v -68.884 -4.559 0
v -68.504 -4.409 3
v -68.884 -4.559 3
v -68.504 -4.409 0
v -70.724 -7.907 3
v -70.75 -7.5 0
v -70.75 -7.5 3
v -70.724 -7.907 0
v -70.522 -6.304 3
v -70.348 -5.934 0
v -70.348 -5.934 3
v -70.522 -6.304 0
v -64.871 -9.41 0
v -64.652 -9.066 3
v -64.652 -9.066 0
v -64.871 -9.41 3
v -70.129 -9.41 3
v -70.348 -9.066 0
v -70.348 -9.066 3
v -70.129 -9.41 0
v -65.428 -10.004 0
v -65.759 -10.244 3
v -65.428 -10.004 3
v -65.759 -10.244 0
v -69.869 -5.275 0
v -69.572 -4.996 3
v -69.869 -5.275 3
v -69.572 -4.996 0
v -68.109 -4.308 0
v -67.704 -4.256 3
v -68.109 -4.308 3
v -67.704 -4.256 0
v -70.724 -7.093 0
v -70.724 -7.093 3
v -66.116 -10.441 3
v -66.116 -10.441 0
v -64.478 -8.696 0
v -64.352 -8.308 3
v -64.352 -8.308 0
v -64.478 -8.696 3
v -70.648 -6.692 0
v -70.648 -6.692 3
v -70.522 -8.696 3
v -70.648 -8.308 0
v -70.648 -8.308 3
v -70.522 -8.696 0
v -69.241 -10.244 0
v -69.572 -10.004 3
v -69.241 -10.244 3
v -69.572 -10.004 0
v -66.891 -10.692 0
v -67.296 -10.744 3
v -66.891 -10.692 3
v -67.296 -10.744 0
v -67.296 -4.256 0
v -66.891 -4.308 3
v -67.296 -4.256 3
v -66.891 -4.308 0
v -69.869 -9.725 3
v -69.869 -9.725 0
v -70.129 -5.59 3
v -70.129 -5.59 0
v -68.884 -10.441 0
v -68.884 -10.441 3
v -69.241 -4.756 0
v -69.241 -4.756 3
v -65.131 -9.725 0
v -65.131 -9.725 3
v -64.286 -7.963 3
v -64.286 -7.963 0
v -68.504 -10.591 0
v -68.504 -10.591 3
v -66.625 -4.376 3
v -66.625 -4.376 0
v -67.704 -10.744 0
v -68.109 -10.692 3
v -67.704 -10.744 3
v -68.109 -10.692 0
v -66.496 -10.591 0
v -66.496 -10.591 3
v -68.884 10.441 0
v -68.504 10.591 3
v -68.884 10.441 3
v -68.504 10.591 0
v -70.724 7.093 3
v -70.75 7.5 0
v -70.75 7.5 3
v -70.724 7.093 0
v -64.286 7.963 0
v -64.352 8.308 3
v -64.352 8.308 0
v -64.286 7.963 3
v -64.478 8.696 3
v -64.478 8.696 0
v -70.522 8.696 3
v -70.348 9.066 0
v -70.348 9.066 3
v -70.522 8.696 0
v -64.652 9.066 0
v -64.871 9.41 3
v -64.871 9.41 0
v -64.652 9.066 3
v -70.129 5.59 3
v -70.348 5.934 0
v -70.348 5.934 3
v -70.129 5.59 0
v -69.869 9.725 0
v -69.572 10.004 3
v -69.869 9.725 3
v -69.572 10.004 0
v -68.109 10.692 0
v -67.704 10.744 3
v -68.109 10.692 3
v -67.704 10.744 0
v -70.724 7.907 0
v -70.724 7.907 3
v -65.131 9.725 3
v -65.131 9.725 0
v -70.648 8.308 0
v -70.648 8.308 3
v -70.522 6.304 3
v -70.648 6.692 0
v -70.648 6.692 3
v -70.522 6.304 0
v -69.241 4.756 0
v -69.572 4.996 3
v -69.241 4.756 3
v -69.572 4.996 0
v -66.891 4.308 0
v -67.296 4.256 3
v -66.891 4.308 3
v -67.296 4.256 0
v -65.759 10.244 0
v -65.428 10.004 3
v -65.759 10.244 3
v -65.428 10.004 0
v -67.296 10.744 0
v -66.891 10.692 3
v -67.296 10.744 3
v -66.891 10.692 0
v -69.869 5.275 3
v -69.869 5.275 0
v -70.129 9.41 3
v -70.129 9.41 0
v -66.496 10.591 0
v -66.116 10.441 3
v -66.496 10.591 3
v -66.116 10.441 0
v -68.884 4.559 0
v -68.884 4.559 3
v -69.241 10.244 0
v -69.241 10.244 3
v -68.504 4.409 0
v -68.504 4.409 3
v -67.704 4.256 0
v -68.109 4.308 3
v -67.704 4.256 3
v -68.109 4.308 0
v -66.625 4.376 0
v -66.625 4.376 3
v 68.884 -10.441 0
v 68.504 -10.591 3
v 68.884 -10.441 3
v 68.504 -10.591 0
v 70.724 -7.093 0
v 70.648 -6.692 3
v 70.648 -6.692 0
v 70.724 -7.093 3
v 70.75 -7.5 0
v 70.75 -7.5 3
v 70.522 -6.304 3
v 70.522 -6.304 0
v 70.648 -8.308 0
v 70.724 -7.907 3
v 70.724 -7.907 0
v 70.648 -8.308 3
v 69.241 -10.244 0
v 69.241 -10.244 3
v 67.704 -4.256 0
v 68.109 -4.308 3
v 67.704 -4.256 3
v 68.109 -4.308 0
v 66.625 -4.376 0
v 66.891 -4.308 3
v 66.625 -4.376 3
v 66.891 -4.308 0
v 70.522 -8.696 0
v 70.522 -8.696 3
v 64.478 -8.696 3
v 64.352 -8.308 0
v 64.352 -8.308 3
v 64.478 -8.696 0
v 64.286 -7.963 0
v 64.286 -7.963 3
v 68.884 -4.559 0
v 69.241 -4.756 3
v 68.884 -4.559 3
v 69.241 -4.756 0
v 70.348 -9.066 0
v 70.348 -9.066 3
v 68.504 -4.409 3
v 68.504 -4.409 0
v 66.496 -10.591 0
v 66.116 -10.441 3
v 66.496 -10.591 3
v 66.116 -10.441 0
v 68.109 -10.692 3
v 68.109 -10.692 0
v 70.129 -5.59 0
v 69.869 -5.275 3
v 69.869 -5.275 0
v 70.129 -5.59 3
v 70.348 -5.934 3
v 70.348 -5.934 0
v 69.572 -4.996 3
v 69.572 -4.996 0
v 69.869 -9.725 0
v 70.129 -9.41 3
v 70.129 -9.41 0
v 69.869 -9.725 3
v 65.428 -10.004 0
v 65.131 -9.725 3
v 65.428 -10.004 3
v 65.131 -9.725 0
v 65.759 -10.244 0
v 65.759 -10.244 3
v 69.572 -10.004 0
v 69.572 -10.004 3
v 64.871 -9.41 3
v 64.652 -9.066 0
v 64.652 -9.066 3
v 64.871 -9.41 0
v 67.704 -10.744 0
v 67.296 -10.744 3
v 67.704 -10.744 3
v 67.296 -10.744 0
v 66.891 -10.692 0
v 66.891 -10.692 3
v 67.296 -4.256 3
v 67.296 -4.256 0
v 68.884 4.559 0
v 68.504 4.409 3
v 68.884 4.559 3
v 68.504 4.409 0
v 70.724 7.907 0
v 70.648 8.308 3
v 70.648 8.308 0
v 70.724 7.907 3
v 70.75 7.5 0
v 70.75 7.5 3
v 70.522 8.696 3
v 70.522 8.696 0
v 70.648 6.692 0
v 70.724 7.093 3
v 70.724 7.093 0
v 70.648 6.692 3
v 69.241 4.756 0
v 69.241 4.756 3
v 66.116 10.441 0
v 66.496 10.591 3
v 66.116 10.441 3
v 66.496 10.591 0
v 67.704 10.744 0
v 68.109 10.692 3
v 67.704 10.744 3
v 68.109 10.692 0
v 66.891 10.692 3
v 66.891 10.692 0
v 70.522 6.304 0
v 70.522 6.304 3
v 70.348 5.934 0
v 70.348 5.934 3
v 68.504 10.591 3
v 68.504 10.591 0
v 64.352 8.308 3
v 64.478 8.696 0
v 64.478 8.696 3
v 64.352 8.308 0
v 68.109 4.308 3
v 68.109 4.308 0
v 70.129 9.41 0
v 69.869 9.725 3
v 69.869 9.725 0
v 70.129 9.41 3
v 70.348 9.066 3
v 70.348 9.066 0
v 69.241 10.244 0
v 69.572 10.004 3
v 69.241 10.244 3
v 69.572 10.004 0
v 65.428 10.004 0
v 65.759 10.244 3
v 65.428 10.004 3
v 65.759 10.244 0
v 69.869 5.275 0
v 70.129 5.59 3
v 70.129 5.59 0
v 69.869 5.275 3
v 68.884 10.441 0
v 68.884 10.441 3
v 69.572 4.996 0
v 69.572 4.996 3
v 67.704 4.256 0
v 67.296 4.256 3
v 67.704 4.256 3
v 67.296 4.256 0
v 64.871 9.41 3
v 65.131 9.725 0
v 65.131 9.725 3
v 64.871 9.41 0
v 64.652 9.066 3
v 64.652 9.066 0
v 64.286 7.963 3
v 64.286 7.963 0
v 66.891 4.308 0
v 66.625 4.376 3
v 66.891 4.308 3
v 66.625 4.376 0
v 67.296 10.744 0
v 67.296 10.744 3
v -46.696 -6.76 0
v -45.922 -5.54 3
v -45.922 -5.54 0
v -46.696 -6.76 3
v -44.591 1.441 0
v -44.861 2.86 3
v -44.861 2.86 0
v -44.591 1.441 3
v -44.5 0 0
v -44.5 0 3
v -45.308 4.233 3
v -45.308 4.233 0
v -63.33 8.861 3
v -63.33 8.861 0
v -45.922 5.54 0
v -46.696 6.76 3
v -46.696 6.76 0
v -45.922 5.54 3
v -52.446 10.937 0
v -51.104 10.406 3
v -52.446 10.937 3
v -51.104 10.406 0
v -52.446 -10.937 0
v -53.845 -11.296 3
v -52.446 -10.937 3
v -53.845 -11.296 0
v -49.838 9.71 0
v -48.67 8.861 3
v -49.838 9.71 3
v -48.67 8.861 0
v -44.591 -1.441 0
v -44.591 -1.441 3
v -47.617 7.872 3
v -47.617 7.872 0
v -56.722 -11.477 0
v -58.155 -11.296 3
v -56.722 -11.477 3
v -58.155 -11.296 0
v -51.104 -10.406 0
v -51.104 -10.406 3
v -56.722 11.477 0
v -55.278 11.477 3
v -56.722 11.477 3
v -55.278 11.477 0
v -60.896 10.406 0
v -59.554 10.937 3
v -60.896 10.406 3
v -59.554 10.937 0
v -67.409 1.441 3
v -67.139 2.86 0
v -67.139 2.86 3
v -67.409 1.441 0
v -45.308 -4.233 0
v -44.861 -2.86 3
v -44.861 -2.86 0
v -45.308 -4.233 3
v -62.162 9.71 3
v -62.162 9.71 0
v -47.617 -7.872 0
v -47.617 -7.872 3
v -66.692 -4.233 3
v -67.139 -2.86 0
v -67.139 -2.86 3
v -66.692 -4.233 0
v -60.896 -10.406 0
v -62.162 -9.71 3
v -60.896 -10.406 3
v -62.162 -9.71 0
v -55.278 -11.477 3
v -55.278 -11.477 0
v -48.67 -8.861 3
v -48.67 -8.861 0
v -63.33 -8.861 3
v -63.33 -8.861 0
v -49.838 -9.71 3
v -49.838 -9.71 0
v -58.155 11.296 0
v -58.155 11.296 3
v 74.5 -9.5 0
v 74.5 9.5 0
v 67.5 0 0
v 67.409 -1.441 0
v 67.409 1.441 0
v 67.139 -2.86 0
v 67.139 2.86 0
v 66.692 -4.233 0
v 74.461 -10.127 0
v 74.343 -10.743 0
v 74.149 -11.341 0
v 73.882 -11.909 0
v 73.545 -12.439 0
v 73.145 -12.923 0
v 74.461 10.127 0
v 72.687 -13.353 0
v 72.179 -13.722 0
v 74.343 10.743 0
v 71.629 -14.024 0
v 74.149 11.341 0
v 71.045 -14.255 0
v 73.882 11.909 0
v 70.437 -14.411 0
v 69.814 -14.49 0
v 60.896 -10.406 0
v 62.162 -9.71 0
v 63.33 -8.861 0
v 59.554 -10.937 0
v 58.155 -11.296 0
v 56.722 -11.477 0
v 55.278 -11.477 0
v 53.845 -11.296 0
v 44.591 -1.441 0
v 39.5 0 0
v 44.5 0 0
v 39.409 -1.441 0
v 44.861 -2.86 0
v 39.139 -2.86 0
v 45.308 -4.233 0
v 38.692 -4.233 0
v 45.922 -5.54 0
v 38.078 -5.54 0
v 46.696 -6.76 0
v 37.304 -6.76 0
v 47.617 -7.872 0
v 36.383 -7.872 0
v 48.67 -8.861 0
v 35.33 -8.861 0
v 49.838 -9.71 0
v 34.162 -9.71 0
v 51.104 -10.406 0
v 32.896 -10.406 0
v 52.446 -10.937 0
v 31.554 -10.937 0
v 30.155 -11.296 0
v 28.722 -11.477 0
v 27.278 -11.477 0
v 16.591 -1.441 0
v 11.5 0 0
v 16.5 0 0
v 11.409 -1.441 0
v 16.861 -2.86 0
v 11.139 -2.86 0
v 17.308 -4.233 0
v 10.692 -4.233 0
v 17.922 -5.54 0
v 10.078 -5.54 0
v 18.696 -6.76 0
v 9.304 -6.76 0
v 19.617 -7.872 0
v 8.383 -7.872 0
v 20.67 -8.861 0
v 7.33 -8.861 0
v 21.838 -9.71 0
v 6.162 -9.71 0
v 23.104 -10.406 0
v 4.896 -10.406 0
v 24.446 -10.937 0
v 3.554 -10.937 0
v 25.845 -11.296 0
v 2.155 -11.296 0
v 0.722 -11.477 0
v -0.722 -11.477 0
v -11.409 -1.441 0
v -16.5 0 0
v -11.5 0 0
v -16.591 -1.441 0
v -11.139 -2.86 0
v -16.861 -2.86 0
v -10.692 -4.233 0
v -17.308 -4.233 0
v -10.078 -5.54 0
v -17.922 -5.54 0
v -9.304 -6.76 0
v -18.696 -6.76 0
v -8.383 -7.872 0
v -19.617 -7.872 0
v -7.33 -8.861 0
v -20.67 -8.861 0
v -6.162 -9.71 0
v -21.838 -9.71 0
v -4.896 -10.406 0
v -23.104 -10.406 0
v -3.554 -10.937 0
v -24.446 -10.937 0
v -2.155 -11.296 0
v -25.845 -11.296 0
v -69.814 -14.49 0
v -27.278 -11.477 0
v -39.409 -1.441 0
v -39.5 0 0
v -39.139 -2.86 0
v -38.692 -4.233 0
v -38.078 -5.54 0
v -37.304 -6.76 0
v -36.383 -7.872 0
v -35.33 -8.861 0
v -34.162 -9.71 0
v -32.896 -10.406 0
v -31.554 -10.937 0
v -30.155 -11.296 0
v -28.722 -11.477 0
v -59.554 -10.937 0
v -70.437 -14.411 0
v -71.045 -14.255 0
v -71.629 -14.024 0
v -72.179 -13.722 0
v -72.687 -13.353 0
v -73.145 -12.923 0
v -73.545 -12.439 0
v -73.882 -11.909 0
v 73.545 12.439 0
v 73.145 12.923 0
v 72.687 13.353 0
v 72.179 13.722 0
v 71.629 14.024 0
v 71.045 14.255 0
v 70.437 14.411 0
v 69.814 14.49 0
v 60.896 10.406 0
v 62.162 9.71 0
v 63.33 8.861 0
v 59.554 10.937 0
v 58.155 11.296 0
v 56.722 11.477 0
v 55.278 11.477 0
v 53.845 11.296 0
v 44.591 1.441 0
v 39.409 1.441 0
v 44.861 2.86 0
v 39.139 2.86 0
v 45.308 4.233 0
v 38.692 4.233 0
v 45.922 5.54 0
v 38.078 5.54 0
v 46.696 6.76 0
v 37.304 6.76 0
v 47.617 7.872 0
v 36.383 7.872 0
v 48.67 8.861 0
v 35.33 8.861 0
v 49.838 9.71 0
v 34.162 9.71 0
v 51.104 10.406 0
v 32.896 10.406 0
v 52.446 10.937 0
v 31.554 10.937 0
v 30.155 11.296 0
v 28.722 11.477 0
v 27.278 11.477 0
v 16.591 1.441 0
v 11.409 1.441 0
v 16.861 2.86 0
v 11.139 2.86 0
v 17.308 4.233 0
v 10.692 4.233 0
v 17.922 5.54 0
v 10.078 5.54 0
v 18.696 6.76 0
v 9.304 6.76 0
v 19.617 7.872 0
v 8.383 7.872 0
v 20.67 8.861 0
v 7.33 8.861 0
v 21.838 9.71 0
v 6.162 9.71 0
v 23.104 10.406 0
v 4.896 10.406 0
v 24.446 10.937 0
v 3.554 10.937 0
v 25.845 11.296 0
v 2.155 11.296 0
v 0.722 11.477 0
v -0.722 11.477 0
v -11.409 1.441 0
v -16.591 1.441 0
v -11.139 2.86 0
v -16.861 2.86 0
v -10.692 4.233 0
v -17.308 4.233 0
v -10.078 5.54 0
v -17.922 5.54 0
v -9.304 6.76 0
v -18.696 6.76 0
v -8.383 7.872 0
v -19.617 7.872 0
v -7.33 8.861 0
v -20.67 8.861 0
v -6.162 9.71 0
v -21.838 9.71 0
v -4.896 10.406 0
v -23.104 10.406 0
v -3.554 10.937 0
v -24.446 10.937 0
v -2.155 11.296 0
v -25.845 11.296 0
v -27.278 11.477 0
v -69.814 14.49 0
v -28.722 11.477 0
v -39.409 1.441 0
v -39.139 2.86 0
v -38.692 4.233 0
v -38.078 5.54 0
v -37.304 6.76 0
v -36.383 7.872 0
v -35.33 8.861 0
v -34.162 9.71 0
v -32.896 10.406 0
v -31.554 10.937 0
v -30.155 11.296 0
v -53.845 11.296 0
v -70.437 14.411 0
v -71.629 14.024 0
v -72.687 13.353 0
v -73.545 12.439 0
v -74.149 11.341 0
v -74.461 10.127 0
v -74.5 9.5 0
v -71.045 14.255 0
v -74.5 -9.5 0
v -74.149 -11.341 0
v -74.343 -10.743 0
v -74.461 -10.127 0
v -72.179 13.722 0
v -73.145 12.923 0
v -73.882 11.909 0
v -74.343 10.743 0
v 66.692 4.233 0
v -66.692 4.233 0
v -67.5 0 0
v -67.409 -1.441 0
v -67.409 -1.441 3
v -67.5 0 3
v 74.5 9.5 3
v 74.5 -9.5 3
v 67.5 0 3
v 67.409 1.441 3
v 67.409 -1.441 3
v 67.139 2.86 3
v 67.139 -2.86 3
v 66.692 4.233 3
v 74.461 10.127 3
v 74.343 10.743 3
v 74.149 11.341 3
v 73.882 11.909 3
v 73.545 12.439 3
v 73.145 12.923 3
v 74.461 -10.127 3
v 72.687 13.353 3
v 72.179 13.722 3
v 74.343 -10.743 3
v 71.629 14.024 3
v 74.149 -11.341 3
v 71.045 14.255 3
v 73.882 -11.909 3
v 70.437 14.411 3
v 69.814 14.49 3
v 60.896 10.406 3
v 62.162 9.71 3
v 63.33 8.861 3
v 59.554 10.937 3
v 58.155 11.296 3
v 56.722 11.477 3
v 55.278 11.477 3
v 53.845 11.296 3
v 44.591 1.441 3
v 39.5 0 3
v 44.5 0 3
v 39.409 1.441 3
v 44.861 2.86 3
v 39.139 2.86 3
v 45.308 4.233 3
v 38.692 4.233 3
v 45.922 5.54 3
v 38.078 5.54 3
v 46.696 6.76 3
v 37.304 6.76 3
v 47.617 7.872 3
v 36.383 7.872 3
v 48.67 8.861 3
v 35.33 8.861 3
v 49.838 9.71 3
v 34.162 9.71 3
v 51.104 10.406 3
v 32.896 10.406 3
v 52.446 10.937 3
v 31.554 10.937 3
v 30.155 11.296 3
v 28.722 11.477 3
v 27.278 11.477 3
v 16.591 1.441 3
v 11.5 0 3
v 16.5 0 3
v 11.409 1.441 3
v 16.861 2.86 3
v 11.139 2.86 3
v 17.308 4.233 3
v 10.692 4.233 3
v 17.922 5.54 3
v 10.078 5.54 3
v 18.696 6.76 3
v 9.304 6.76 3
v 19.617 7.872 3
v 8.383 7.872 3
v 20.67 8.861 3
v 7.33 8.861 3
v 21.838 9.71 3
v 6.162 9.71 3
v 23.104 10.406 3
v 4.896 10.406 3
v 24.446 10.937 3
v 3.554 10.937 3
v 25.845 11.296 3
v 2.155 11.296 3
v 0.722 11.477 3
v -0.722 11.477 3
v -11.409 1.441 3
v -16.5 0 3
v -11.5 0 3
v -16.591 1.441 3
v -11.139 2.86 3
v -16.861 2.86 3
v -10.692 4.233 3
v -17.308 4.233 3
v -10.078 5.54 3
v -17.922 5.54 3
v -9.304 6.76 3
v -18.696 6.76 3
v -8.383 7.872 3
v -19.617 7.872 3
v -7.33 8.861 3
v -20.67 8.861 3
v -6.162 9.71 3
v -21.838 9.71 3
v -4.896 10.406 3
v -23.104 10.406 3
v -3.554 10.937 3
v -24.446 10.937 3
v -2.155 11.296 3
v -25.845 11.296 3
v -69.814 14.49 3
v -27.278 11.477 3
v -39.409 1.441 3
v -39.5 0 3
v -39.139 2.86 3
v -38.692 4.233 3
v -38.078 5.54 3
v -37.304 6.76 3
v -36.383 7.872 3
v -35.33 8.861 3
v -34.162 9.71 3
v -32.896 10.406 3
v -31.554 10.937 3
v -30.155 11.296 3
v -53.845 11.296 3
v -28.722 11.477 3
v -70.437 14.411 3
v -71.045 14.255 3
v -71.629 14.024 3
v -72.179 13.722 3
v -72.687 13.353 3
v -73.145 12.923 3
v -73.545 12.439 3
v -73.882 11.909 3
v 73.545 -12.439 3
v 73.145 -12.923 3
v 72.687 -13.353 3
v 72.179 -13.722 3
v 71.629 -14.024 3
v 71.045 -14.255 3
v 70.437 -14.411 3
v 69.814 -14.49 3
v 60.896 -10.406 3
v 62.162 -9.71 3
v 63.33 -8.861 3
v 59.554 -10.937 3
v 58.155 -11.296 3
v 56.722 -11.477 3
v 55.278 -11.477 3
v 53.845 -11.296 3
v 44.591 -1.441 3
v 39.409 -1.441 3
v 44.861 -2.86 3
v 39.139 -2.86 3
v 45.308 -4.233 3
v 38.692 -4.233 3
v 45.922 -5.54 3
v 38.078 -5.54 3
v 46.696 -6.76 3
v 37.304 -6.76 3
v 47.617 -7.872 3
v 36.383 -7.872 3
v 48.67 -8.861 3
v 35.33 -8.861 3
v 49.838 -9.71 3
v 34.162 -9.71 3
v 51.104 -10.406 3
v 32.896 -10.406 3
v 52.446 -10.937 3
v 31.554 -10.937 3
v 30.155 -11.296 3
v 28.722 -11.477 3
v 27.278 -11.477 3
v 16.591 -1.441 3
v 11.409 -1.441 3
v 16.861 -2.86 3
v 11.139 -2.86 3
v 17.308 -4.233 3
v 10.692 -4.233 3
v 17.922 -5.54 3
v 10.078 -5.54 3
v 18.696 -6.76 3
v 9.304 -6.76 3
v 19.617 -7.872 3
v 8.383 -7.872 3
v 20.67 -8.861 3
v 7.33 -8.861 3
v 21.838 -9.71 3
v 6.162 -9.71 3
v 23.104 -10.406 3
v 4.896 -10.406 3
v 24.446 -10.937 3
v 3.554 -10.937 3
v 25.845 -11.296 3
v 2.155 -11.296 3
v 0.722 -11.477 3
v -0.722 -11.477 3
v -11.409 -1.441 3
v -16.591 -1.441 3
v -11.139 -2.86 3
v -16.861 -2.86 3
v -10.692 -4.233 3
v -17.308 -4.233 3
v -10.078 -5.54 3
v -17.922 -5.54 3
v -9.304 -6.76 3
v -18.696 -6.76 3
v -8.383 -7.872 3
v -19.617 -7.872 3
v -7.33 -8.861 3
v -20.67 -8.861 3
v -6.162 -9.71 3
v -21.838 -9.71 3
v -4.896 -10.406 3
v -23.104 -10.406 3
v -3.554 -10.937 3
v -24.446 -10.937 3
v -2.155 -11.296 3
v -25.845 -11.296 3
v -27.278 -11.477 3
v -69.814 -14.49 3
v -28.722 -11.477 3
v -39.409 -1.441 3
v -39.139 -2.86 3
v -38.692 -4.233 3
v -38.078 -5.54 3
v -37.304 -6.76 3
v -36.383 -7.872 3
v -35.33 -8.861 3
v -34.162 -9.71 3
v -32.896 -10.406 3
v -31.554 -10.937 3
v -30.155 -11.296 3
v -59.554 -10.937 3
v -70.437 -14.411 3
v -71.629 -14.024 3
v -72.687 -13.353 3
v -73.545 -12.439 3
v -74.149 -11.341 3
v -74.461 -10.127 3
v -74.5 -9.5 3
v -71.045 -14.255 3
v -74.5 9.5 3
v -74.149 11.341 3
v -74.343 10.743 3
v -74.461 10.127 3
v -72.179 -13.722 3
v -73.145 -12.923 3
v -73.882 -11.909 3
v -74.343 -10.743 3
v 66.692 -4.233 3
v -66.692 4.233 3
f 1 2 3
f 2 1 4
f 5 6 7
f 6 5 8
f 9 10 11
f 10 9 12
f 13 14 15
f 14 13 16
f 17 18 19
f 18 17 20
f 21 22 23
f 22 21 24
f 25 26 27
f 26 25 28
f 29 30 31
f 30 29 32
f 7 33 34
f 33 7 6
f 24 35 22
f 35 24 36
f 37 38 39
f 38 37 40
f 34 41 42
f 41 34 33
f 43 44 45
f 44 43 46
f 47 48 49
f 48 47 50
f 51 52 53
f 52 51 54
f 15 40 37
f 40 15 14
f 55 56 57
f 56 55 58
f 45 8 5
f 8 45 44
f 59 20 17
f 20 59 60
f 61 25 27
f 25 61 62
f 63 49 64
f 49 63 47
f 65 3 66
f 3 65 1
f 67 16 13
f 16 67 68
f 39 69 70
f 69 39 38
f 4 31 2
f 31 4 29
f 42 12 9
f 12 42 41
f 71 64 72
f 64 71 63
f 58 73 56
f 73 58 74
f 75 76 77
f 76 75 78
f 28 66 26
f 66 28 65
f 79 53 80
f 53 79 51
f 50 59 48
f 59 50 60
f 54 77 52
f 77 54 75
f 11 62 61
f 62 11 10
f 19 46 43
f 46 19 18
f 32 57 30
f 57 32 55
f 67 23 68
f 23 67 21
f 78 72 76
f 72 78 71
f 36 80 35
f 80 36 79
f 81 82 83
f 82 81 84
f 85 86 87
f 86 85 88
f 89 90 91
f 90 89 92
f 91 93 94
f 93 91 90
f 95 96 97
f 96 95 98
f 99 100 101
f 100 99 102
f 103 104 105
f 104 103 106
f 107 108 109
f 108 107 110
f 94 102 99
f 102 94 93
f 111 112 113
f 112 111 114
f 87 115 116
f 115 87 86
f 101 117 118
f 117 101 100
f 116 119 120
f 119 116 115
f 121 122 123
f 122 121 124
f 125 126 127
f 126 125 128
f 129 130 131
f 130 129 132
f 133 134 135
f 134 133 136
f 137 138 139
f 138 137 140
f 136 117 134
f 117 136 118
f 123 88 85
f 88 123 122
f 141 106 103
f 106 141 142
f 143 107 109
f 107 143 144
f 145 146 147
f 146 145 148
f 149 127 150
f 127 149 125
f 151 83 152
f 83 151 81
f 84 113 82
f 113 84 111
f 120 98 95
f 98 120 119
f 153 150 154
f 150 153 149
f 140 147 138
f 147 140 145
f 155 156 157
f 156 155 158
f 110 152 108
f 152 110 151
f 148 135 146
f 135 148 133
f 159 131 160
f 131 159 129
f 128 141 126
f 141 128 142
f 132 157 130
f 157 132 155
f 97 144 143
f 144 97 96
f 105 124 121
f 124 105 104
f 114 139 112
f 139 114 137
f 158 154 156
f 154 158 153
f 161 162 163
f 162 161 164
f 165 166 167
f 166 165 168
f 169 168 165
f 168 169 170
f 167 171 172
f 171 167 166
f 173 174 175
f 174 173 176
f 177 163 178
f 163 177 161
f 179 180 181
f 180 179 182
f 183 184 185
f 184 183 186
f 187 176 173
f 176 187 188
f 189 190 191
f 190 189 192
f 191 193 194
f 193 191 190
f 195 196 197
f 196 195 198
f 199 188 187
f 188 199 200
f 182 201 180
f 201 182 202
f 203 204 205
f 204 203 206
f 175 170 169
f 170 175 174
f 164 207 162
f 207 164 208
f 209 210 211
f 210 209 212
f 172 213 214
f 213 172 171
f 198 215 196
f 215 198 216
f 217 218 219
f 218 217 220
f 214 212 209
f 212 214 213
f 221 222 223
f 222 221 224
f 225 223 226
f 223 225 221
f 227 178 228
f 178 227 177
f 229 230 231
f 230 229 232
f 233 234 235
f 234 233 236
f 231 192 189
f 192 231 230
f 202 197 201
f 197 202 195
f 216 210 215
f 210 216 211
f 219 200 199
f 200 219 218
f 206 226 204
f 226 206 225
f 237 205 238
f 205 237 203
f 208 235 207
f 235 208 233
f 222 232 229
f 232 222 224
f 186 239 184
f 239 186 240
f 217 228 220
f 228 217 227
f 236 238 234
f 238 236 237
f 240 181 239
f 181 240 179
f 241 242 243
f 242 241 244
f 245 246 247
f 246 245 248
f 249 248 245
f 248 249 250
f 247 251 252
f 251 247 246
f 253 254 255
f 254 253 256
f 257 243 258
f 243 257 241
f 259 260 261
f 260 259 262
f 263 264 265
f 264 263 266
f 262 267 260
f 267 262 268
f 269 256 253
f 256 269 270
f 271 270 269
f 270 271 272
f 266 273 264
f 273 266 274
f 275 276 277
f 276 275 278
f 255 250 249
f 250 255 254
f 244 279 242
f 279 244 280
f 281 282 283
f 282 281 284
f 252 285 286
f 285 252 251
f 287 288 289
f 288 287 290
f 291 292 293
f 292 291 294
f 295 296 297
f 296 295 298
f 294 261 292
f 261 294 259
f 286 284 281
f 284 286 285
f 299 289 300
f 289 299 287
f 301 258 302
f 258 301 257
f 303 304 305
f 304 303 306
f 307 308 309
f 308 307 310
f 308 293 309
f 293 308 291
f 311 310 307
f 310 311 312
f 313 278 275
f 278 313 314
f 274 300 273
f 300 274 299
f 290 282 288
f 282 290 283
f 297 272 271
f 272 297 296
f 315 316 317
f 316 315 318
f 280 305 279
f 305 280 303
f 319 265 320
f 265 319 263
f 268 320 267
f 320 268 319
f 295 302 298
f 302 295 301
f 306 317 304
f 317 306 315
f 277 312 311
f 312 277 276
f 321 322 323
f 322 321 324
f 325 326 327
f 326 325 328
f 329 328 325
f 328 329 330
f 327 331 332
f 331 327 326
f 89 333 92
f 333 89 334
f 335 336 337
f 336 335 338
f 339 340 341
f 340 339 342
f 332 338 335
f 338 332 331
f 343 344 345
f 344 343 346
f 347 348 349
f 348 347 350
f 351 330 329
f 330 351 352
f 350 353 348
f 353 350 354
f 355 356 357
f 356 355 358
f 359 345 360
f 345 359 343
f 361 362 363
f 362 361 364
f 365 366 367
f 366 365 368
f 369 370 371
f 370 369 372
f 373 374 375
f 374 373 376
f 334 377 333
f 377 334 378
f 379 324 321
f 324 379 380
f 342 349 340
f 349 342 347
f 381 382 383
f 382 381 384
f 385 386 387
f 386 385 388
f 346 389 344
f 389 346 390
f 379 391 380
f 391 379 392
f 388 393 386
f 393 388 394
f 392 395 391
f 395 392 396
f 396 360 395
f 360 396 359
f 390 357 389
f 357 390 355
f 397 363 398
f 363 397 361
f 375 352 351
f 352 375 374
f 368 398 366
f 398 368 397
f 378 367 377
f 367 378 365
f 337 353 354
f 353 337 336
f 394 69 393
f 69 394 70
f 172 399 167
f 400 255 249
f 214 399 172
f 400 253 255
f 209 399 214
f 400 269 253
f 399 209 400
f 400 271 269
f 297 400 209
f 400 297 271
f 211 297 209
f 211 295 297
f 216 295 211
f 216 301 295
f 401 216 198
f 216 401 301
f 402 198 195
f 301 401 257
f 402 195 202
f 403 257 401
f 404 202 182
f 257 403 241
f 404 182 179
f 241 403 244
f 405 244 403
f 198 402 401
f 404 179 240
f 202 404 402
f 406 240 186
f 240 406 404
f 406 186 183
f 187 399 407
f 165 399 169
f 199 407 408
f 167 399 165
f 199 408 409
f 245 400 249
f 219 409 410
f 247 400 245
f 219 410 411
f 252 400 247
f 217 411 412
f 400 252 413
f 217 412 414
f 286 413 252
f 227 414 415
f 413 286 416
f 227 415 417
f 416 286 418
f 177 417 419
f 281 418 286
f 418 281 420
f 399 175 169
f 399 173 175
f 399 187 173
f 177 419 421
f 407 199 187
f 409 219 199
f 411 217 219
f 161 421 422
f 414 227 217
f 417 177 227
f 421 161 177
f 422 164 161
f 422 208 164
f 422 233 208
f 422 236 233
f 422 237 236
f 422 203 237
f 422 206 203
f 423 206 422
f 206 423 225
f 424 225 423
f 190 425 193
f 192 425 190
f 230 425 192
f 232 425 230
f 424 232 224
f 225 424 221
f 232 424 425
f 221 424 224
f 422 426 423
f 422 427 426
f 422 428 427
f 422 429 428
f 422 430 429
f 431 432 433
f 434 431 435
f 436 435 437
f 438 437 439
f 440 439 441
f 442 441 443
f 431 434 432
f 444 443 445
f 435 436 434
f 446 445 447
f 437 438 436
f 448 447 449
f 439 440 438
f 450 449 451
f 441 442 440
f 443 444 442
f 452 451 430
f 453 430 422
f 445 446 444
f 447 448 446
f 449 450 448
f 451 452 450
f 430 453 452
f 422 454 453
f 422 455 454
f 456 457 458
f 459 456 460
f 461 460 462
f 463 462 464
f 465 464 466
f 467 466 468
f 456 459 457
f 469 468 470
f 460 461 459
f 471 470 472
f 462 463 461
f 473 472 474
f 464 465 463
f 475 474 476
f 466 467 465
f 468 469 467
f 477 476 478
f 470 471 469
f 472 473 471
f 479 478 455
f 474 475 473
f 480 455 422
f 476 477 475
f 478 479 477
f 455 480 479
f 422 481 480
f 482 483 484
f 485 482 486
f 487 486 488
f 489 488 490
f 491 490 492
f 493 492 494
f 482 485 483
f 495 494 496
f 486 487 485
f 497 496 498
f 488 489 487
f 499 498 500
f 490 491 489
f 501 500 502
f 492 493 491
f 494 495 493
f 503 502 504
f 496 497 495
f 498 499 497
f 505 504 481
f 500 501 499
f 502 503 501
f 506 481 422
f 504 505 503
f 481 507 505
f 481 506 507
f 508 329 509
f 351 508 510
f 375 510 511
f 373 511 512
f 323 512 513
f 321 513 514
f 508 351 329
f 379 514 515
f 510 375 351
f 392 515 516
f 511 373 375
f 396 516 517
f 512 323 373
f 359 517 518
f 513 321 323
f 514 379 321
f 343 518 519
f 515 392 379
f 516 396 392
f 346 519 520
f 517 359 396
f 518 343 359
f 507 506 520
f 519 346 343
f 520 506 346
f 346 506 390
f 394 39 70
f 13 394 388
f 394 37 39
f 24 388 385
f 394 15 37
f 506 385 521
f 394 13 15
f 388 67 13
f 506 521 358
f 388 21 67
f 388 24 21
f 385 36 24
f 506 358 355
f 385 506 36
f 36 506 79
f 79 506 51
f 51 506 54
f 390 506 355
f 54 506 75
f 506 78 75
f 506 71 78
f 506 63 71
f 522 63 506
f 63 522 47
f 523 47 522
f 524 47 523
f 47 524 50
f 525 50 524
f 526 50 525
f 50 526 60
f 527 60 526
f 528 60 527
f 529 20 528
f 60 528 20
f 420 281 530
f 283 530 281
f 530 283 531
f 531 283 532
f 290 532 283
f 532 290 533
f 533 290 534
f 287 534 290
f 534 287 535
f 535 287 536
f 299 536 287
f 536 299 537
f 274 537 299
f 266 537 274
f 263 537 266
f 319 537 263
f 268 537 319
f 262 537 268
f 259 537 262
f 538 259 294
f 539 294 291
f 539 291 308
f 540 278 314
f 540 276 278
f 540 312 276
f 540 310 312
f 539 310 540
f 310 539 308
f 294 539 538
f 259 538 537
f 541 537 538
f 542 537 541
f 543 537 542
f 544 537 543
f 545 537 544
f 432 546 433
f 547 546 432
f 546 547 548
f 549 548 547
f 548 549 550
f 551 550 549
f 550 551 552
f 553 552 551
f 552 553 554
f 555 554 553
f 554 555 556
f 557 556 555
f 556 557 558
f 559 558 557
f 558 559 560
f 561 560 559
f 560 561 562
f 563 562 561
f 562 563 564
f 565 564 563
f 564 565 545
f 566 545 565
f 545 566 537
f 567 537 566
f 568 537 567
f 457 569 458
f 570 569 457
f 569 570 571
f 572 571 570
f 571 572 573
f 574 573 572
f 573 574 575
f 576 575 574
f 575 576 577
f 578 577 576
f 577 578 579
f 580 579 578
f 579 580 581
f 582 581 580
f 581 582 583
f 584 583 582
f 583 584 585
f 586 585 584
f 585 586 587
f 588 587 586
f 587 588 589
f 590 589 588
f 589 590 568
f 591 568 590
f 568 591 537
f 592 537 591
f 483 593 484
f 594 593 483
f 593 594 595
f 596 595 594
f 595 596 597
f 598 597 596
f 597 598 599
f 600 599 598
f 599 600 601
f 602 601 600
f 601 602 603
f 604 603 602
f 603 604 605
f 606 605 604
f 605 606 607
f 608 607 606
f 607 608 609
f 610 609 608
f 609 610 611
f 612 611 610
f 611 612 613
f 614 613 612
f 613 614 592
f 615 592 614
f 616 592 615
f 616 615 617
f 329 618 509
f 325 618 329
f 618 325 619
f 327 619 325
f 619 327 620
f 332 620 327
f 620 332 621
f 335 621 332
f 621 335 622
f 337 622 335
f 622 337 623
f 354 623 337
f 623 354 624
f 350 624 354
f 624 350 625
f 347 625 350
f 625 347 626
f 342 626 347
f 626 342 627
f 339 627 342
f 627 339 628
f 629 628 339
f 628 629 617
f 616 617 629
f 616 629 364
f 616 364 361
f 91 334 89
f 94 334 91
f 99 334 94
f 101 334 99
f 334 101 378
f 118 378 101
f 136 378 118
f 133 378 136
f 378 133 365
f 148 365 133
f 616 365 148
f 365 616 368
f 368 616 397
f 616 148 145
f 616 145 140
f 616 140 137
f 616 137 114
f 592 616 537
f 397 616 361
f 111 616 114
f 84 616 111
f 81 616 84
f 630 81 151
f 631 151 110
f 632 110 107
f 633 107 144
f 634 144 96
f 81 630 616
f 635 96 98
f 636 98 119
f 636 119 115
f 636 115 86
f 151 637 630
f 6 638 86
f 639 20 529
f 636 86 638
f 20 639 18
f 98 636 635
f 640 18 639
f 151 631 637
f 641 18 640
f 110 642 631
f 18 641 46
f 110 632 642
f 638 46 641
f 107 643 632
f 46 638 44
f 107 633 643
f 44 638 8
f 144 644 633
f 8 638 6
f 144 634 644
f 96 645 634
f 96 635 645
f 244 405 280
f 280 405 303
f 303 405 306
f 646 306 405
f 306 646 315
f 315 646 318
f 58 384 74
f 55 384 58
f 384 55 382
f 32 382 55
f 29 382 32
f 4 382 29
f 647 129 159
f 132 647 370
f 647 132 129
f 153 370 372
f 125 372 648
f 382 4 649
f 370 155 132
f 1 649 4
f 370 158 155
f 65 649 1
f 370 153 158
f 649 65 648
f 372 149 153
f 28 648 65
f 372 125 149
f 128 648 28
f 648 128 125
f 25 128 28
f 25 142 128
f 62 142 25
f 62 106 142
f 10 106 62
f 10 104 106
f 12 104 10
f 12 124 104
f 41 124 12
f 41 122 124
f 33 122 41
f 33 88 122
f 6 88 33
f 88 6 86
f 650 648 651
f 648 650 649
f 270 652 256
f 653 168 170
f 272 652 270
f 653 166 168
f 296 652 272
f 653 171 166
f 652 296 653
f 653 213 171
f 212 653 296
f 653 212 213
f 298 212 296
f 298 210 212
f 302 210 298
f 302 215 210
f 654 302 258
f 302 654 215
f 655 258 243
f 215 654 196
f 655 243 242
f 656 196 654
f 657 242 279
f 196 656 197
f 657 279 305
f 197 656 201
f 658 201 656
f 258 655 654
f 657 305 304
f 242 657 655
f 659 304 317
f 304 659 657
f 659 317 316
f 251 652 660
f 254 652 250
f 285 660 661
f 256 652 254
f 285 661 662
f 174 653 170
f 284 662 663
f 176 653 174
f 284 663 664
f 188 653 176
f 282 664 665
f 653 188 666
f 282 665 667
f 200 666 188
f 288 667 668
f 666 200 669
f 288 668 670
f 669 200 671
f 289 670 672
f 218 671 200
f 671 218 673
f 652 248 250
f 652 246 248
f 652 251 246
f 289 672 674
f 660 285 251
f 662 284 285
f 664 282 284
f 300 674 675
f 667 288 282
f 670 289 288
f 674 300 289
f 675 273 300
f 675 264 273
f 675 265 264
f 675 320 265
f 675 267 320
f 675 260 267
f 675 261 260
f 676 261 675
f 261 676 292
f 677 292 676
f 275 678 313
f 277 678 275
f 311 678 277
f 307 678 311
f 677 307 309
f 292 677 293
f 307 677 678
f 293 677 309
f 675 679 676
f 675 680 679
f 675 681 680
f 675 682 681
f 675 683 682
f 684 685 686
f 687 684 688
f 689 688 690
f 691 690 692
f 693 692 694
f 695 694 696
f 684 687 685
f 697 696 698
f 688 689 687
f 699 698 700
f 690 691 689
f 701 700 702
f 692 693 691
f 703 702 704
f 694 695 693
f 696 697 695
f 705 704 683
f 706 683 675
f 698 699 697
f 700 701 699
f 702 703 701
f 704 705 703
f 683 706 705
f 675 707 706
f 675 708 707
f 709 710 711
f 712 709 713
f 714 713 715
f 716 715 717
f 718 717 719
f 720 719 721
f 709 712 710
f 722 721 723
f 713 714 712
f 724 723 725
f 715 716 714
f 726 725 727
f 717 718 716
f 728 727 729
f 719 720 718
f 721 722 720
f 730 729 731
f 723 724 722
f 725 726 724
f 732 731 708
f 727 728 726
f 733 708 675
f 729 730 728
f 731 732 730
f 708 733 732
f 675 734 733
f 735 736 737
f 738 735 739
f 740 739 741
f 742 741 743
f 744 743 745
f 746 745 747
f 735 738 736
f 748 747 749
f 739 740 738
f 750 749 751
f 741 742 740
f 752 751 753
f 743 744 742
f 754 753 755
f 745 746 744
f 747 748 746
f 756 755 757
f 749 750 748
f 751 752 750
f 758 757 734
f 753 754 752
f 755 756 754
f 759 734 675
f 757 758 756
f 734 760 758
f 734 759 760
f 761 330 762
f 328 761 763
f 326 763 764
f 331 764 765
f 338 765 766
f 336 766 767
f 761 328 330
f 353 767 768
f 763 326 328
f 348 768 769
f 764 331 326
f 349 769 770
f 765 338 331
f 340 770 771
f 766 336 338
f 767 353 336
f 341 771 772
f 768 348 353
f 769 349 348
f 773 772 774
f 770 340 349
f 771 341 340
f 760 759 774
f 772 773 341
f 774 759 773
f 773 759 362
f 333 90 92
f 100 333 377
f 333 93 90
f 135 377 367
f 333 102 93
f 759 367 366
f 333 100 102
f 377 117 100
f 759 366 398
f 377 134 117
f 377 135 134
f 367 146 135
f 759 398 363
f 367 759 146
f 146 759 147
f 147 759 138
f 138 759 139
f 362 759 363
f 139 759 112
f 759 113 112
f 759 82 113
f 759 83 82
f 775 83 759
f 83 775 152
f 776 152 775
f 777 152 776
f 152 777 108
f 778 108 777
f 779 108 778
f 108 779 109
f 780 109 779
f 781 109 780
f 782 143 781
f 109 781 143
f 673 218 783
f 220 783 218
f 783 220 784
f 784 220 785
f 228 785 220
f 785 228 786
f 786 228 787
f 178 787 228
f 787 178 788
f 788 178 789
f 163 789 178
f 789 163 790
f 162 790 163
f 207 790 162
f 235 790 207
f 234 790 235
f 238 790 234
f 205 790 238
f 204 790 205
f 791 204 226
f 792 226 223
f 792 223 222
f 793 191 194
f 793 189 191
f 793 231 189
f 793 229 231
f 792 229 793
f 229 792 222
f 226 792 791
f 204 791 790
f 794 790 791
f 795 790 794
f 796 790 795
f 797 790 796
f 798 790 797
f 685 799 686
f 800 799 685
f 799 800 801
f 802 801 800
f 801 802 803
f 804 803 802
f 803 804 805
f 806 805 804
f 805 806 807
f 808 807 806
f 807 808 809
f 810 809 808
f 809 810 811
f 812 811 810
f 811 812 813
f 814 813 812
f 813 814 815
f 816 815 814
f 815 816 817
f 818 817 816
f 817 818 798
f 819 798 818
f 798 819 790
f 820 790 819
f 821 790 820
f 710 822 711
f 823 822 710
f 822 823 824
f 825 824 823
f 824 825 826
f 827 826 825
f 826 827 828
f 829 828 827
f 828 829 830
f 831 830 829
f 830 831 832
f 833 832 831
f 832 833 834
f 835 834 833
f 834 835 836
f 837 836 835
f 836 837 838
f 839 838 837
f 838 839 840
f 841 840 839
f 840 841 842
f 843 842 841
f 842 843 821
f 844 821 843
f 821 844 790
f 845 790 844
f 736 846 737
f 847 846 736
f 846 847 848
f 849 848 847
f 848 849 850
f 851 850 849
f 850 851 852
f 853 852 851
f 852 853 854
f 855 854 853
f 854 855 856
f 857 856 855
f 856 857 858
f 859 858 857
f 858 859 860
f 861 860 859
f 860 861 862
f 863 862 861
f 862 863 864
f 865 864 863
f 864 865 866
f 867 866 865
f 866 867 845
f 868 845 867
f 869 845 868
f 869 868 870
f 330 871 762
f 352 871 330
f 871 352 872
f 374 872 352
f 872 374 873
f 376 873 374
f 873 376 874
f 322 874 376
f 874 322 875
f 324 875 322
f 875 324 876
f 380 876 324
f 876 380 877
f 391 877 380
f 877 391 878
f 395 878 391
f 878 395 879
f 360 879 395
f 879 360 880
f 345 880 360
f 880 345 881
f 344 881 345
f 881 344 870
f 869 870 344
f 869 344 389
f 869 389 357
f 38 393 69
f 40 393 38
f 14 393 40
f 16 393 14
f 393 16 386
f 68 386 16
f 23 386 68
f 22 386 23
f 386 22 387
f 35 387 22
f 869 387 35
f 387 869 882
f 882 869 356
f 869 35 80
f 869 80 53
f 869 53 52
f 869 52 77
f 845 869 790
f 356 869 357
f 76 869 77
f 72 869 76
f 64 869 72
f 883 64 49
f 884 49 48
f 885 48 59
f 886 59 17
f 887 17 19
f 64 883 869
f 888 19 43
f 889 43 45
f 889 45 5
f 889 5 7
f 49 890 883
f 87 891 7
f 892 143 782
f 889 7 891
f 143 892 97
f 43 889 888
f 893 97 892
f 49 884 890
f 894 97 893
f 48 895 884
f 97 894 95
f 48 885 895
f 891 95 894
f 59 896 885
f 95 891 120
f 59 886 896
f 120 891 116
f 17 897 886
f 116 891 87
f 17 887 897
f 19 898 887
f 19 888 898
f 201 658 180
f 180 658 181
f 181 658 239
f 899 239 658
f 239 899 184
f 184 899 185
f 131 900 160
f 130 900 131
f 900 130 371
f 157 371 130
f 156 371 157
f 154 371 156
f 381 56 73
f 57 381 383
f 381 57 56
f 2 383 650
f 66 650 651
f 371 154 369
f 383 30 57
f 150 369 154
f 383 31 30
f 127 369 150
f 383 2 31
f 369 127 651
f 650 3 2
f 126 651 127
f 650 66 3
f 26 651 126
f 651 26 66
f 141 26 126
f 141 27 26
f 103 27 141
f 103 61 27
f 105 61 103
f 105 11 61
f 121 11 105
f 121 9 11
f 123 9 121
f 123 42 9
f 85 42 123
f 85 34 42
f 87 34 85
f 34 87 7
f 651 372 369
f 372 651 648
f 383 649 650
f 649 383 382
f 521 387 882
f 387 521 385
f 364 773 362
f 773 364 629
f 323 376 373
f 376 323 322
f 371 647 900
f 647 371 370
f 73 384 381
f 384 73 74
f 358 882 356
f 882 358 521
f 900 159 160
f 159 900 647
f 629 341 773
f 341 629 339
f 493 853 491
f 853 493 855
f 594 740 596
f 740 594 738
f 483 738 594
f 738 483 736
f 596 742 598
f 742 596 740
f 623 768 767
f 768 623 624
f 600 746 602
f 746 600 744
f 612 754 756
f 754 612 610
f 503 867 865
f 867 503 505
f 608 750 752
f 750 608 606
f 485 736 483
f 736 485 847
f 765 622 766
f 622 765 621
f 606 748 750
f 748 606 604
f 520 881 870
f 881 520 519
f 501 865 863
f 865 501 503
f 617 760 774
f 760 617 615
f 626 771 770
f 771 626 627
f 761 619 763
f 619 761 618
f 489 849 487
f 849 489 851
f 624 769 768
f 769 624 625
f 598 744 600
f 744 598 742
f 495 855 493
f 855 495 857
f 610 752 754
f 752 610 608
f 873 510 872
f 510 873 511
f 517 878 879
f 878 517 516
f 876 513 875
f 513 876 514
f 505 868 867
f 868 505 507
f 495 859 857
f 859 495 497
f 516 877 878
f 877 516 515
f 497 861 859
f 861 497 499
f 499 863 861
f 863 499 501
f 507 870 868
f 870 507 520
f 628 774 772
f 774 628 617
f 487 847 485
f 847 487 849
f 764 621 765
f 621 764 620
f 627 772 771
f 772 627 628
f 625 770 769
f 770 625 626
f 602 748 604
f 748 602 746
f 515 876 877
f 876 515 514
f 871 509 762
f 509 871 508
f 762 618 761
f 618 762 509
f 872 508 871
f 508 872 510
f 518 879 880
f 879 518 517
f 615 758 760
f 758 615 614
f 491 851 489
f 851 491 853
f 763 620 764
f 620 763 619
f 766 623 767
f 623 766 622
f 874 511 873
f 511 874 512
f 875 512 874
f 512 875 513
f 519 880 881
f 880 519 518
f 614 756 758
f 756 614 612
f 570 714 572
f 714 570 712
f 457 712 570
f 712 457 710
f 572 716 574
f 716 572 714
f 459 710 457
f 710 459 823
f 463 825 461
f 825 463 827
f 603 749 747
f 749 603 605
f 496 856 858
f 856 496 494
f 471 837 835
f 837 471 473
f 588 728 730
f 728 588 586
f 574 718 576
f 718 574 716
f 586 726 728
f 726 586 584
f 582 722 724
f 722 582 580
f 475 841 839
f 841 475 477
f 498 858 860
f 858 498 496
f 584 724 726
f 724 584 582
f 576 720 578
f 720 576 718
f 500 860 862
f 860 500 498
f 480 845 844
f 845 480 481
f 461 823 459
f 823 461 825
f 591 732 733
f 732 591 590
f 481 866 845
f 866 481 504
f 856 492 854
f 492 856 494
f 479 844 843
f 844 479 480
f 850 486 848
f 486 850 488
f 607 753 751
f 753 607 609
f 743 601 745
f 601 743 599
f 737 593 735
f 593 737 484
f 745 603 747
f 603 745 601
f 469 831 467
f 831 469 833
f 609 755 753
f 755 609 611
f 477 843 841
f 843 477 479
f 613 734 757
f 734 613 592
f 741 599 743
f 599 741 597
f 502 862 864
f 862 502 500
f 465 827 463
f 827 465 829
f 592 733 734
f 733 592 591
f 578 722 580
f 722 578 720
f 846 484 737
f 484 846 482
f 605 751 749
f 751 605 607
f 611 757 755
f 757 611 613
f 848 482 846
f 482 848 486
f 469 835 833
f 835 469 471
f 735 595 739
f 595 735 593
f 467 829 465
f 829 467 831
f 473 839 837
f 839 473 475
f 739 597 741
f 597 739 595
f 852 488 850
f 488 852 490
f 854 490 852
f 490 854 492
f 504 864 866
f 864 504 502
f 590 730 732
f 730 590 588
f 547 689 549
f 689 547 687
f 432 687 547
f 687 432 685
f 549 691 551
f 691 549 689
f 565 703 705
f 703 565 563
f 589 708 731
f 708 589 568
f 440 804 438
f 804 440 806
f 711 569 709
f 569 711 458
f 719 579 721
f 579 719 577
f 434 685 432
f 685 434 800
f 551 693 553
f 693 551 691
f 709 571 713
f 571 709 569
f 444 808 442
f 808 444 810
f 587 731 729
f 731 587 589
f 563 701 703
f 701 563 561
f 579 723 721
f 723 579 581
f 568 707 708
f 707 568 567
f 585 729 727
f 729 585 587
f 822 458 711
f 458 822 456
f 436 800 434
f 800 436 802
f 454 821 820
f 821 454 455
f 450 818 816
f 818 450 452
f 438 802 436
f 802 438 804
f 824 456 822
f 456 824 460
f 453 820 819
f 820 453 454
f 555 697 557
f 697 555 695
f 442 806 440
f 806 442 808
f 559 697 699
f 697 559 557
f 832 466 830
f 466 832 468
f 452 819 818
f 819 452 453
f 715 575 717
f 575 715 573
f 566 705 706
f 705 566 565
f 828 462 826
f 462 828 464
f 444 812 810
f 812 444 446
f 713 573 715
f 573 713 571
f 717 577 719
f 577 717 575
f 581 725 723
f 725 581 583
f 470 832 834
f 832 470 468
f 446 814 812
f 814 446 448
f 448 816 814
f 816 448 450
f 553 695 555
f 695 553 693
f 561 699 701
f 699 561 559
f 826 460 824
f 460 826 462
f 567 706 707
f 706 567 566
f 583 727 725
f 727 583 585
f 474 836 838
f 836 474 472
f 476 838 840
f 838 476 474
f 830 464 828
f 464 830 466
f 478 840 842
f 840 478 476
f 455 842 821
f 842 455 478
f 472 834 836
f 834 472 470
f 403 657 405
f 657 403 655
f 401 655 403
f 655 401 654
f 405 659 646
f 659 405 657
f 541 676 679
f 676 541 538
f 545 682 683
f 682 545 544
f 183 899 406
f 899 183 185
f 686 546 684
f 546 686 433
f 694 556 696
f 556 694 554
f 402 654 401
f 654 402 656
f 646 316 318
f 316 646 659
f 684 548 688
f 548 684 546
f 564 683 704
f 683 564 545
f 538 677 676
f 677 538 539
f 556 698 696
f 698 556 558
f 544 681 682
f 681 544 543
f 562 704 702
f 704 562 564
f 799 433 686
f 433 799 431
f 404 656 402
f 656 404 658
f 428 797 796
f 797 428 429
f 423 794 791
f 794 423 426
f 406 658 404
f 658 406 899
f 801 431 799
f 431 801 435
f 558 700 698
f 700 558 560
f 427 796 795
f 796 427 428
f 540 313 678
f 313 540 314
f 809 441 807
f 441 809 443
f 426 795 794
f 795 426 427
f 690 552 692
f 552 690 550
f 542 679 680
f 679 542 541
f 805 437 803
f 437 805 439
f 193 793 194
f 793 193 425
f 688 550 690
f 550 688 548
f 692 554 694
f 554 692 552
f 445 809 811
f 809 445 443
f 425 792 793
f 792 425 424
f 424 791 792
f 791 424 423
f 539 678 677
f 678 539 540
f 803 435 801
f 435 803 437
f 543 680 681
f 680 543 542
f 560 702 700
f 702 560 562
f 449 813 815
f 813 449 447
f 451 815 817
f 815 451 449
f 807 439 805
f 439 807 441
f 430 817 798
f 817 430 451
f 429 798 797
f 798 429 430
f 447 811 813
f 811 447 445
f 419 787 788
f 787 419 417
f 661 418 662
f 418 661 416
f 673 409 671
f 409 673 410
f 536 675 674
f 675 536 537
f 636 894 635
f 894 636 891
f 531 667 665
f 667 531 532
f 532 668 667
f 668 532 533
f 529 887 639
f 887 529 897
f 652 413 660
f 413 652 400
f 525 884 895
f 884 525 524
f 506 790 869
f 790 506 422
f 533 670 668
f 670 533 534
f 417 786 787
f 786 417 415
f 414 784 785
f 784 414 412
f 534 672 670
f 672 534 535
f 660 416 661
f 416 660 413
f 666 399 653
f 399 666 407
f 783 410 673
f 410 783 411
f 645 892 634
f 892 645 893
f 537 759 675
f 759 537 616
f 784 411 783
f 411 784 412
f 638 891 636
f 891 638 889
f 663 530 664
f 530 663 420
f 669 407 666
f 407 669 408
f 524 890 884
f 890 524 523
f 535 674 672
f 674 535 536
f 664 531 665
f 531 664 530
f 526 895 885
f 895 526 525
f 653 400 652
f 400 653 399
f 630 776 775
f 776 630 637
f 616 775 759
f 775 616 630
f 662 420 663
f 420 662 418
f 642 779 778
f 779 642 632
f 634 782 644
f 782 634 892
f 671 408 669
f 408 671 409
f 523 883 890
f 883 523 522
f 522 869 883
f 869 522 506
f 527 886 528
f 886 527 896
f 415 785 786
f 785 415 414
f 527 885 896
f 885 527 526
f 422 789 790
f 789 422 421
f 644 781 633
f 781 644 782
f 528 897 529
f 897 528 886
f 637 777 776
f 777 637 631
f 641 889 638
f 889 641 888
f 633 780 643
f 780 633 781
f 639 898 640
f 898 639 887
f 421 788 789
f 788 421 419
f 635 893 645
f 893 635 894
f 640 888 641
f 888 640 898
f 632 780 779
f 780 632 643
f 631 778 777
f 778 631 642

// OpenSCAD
$fn = 50;


difference() {
	union() {
		hull() {
			translate(v = [-69.5000000000, 9.5000000000, 0]) {
				cylinder(h = 3, r = 5);
			}
			translate(v = [69.5000000000, 9.5000000000, 0]) {
				cylinder(h = 3, r = 5);
			}
			translate(v = [-69.5000000000, -9.5000000000, 0]) {
				cylinder(h = 3, r = 5);
			}
			translate(v = [69.5000000000, -9.5000000000, 0]) {
				cylinder(h = 3, r = 5);
			}
		}
	}
	union() {
		#translate(v = [-67.5000000000, -7.5000000000, -100.0000000000]) {
			cylinder(h = 200, r = 3.2500000000);
		}
		#translate(v = [-67.5000000000, 7.5000000000, -100.0000000000]) {
			cylinder(h = 200, r = 3.2500000000);
		}
		#translate(v = [67.5000000000, -7.5000000000, -100.0000000000]) {
			cylinder(h = 200, r = 3.2500000000);
		}
		#translate(v = [67.5000000000, 7.5000000000, -100.0000000000]) {
			cylinder(h = 200, r = 3.2500000000);
		}
		#translate(v = [-56.0000000000, 0, 0]) {
			cylinder(h = 3, r = 11.5000000000);
		}
		#translate(v = [-28.0000000000, 0, 0]) {
			cylinder(h = 3, r = 11.5000000000);
		}
		#cylinder(h = 3, r = 11.5000000000);
		#translate(v = [28.0000000000, 0, 0]) {
			cylinder(h = 3, r = 11.5000000000);
		}
		#translate(v = [56.0000000000, 0, 0]) {
			cylinder(h = 3, r = 11.5000000000);
		}
	}
}
